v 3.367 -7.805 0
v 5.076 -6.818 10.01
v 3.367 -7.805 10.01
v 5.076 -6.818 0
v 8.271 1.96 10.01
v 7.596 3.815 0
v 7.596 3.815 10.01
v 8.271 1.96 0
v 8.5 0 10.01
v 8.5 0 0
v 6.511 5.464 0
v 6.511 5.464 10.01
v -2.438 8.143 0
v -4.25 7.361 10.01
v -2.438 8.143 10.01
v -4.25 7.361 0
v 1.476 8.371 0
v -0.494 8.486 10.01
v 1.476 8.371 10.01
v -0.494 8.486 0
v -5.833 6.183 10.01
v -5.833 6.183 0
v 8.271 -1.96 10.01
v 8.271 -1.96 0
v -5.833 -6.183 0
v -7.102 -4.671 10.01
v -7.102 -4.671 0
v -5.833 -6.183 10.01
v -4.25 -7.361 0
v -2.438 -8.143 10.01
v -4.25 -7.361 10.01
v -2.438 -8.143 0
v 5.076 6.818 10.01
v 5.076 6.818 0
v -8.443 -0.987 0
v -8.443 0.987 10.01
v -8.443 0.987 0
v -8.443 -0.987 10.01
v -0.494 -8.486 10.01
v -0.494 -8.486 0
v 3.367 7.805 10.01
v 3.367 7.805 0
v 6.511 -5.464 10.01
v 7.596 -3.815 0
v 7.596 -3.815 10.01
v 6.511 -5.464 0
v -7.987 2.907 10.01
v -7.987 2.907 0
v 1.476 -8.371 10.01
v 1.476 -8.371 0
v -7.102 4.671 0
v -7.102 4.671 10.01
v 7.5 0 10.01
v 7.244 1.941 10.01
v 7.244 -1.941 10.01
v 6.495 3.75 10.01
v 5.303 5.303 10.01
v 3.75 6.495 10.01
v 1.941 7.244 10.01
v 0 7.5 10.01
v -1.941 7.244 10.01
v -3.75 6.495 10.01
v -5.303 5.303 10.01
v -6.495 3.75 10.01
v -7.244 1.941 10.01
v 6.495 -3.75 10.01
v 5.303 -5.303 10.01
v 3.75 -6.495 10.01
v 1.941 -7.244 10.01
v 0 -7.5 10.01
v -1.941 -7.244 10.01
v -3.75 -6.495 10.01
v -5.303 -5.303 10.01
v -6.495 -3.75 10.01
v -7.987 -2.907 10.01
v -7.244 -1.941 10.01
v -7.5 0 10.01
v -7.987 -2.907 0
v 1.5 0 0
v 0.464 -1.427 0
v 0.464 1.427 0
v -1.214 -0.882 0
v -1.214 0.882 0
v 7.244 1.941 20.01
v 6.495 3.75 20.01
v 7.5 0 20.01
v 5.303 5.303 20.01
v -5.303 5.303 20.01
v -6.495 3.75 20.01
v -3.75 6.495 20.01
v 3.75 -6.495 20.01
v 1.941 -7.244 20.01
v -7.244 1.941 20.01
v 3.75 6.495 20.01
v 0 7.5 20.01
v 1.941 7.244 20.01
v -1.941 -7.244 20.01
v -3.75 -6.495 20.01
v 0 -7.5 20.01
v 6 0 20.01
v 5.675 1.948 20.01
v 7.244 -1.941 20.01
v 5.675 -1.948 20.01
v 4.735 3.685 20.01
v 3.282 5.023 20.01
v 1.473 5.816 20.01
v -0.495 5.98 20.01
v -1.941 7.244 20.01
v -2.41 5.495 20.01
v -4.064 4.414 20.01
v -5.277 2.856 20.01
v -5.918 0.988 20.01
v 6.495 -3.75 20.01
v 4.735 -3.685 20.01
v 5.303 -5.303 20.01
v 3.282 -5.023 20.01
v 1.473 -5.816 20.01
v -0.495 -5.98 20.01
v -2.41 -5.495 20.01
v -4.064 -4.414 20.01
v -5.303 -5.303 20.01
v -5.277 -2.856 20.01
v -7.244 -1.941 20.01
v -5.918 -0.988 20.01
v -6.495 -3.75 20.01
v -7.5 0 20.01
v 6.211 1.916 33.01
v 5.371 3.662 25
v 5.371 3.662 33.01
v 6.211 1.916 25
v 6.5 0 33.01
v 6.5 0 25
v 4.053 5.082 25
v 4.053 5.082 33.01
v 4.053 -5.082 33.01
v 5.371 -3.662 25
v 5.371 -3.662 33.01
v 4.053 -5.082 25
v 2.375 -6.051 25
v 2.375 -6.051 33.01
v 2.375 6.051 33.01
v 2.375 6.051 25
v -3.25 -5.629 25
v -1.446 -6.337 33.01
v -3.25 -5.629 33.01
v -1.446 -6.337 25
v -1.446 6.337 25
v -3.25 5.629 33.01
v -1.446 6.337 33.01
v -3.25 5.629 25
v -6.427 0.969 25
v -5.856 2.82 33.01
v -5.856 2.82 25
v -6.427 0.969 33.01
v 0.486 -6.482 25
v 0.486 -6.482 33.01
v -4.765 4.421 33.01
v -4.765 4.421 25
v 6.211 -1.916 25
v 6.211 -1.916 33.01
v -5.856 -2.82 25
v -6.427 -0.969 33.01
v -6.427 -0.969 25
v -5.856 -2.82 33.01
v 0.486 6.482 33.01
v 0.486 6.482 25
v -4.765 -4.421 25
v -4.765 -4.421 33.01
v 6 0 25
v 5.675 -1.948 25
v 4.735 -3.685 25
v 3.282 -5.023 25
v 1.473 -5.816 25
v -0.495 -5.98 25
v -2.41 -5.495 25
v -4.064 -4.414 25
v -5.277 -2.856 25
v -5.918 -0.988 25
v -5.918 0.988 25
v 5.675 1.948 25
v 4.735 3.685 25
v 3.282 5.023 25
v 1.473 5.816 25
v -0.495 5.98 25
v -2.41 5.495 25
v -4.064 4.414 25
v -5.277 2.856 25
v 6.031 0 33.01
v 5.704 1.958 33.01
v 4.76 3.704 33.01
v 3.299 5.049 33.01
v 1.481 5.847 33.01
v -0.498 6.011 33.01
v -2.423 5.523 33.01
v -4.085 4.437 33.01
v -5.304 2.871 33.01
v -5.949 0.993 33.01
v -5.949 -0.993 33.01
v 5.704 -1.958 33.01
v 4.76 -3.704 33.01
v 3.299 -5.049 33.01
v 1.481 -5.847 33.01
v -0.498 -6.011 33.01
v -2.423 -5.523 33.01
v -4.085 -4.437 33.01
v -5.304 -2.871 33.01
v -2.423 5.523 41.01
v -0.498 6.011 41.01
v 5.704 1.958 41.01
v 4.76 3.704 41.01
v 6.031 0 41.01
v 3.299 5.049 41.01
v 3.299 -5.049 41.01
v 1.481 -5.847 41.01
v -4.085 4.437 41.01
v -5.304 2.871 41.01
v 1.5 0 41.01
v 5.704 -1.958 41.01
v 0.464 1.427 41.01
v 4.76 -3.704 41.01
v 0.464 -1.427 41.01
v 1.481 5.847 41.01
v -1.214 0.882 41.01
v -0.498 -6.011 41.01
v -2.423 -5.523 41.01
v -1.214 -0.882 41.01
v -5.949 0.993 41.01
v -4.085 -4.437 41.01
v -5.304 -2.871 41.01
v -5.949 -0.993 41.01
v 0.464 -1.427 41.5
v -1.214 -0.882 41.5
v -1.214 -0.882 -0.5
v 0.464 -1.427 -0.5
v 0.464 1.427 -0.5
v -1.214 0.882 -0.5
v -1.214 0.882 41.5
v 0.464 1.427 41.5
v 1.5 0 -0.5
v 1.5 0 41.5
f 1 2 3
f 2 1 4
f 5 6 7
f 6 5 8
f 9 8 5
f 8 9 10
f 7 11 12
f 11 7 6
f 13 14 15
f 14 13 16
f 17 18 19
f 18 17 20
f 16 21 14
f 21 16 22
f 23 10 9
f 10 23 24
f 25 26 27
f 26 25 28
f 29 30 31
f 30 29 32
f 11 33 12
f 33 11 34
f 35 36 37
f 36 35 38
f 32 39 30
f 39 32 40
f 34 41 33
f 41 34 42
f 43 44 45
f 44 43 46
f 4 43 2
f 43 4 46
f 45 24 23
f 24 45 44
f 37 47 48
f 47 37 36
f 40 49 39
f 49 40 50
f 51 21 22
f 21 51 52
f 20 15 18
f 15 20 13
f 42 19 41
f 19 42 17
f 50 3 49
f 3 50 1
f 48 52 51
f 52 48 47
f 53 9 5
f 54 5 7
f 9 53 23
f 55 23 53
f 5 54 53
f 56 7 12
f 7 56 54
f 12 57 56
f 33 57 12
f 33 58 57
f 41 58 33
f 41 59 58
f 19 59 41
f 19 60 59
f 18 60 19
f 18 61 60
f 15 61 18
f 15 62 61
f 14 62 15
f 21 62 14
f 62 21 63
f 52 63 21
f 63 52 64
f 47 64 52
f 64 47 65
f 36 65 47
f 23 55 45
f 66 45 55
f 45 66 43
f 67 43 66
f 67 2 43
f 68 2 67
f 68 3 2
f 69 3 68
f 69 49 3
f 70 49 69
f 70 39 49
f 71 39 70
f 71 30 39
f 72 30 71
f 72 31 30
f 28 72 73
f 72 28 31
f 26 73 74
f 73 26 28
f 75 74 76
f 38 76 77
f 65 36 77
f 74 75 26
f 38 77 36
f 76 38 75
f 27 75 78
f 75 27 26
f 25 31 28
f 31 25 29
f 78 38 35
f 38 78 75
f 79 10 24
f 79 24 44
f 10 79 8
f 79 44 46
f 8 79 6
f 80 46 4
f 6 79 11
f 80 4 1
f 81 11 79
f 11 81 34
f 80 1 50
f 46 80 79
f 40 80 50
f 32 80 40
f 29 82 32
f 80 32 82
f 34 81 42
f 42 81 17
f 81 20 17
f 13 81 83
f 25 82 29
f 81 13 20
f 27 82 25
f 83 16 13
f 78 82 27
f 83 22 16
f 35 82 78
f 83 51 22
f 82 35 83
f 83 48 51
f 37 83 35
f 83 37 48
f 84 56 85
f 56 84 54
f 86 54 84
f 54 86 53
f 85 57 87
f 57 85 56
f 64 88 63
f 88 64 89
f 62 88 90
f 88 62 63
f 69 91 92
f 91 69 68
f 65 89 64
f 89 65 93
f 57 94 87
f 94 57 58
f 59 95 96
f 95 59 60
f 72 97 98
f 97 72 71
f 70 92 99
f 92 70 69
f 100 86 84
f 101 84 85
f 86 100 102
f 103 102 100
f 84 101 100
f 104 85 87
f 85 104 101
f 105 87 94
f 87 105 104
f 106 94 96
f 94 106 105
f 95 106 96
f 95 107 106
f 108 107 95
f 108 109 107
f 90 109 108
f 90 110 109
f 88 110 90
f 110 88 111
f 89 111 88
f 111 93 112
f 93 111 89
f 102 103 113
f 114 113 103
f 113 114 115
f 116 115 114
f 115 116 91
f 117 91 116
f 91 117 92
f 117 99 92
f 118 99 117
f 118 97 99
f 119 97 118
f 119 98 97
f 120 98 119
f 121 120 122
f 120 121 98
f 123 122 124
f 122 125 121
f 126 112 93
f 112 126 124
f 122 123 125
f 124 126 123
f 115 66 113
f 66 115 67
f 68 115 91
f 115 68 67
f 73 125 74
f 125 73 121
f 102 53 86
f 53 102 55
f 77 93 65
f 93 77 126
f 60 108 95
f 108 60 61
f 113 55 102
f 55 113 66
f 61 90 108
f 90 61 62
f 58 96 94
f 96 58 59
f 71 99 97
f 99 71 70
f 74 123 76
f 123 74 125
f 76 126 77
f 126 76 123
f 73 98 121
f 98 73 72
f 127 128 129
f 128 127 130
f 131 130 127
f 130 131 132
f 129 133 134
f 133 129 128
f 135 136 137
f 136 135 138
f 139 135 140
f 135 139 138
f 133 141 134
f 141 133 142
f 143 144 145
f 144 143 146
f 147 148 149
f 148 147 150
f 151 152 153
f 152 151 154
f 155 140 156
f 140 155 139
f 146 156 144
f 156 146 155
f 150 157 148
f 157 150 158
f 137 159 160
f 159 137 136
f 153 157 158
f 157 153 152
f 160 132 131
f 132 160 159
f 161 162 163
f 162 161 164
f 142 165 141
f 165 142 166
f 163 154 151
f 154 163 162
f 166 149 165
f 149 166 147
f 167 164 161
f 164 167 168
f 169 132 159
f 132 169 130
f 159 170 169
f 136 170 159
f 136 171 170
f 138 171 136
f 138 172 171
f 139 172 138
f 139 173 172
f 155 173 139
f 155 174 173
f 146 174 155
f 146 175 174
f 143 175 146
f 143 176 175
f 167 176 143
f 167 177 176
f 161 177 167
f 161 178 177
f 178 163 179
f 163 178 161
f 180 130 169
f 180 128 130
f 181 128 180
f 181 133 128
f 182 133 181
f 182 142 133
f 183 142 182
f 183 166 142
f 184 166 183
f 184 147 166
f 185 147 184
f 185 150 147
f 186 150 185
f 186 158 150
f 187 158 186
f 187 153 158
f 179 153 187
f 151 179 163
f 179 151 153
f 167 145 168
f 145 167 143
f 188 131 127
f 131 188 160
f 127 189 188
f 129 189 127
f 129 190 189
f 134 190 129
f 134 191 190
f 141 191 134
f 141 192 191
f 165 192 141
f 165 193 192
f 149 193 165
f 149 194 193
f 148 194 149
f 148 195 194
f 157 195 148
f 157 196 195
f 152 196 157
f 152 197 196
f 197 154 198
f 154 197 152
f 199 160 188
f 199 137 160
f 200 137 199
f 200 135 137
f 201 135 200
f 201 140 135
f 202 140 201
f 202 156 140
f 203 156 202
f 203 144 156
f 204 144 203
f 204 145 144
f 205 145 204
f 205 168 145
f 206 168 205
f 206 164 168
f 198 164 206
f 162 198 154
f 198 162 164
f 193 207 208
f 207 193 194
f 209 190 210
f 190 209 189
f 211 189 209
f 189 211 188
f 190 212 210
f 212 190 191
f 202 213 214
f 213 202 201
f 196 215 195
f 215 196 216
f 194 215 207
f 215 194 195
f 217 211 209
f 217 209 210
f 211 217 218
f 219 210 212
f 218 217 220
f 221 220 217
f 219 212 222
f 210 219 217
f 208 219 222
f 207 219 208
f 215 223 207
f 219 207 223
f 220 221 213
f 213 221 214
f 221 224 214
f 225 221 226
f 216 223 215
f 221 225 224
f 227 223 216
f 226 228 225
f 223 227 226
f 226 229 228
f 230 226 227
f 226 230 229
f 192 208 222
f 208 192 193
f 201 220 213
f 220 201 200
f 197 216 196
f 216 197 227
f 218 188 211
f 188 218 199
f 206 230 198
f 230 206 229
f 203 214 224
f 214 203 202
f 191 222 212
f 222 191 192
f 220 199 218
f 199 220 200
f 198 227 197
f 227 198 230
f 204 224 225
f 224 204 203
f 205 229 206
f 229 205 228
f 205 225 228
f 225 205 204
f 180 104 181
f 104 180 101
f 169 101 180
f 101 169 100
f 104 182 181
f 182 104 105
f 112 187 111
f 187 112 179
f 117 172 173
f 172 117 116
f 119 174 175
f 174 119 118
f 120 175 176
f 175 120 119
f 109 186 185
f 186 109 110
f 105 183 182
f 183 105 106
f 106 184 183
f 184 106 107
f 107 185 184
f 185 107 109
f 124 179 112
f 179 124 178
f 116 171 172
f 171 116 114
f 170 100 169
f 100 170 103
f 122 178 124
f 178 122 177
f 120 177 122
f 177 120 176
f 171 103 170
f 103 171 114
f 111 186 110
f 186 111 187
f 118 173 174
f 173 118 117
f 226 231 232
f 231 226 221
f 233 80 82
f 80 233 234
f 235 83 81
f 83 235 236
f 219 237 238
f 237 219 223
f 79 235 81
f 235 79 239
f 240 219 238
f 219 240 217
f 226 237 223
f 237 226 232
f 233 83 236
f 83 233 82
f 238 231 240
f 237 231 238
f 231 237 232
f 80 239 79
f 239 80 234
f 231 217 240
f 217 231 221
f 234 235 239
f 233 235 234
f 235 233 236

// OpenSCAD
// Hose-barb reducer: 8 mm ID tubing to 5 mm ID tubing
// Print orientation: standing upright along +Z, centred on origin in X/Y

// ---------------- Parameters ----------------
reducer_d      = 12;   // collar diameter (z = 20 to 25)
bore_d         = 3;    // central through-bore diameter
eps            = 0.5;  // overcut for clean differences

// 8 mm tubing barbs: z = 0 to 20
nb_8            = 2;   // number of barbs
hb_8            = 10;  // barb height
od_8_bottom     = 7.5; // outer diameter at bottom of barbs
od_8_top        = 9.5; // outer diameter at top of barbs

// 5 mm tubing barbs: z = 25 to 41
nb_5            = 2;   // number of barbs
hb_5            = 8;   // barb height
od_5_bottom     = 6.5; // outer diameter at bottom of barbs
od_5_top        = 5.0; // outer diameter at top of barbs

// ---------------- Derived ----------------
function f8(z) = z < 10 ? od_8_bottom + (od_8_top - od_8_bottom) * z / 10 :
                   z > 10 ? od_8_bottom :
                   reducer_d;   // overlap into collar for a solid union
function f5(z) = z < 34.5 ? od_5_bottom :
                   z > 34.5 ? od_5_bottom + (od_5_top - od_5_bottom) * (z - 34.5) / 8 :
                   reducer_d;   // overlap into collar for a solid union

// ---------------- Model ----------------
union() {
    // 8 mm barbs
    for (i = [0 : nb_8 - 1])
        translate([0, 0, i * hb_8])
            cylinder(h = hb_8 + 0.01, r = f8(z = (i * hb_8 + hb_8 / 2)));

    // Collar
    translate([0, 0, 20])
        cylinder(h = 5, d = reducer_d);

    // 5 mm barbs
    for (i = [0 : nb_5 - 1])
        translate([0, 0, 25 + i * hb_5])
            cylinder(h = hb_5 + 0.01, r = f5(z = (25 + i * hb_5 + hb_5 / 2)));

    // Through-bore
    translate([0, 0, -eps])
        cylinder(h = 41 + 2 * eps, d = bore_d);
}
